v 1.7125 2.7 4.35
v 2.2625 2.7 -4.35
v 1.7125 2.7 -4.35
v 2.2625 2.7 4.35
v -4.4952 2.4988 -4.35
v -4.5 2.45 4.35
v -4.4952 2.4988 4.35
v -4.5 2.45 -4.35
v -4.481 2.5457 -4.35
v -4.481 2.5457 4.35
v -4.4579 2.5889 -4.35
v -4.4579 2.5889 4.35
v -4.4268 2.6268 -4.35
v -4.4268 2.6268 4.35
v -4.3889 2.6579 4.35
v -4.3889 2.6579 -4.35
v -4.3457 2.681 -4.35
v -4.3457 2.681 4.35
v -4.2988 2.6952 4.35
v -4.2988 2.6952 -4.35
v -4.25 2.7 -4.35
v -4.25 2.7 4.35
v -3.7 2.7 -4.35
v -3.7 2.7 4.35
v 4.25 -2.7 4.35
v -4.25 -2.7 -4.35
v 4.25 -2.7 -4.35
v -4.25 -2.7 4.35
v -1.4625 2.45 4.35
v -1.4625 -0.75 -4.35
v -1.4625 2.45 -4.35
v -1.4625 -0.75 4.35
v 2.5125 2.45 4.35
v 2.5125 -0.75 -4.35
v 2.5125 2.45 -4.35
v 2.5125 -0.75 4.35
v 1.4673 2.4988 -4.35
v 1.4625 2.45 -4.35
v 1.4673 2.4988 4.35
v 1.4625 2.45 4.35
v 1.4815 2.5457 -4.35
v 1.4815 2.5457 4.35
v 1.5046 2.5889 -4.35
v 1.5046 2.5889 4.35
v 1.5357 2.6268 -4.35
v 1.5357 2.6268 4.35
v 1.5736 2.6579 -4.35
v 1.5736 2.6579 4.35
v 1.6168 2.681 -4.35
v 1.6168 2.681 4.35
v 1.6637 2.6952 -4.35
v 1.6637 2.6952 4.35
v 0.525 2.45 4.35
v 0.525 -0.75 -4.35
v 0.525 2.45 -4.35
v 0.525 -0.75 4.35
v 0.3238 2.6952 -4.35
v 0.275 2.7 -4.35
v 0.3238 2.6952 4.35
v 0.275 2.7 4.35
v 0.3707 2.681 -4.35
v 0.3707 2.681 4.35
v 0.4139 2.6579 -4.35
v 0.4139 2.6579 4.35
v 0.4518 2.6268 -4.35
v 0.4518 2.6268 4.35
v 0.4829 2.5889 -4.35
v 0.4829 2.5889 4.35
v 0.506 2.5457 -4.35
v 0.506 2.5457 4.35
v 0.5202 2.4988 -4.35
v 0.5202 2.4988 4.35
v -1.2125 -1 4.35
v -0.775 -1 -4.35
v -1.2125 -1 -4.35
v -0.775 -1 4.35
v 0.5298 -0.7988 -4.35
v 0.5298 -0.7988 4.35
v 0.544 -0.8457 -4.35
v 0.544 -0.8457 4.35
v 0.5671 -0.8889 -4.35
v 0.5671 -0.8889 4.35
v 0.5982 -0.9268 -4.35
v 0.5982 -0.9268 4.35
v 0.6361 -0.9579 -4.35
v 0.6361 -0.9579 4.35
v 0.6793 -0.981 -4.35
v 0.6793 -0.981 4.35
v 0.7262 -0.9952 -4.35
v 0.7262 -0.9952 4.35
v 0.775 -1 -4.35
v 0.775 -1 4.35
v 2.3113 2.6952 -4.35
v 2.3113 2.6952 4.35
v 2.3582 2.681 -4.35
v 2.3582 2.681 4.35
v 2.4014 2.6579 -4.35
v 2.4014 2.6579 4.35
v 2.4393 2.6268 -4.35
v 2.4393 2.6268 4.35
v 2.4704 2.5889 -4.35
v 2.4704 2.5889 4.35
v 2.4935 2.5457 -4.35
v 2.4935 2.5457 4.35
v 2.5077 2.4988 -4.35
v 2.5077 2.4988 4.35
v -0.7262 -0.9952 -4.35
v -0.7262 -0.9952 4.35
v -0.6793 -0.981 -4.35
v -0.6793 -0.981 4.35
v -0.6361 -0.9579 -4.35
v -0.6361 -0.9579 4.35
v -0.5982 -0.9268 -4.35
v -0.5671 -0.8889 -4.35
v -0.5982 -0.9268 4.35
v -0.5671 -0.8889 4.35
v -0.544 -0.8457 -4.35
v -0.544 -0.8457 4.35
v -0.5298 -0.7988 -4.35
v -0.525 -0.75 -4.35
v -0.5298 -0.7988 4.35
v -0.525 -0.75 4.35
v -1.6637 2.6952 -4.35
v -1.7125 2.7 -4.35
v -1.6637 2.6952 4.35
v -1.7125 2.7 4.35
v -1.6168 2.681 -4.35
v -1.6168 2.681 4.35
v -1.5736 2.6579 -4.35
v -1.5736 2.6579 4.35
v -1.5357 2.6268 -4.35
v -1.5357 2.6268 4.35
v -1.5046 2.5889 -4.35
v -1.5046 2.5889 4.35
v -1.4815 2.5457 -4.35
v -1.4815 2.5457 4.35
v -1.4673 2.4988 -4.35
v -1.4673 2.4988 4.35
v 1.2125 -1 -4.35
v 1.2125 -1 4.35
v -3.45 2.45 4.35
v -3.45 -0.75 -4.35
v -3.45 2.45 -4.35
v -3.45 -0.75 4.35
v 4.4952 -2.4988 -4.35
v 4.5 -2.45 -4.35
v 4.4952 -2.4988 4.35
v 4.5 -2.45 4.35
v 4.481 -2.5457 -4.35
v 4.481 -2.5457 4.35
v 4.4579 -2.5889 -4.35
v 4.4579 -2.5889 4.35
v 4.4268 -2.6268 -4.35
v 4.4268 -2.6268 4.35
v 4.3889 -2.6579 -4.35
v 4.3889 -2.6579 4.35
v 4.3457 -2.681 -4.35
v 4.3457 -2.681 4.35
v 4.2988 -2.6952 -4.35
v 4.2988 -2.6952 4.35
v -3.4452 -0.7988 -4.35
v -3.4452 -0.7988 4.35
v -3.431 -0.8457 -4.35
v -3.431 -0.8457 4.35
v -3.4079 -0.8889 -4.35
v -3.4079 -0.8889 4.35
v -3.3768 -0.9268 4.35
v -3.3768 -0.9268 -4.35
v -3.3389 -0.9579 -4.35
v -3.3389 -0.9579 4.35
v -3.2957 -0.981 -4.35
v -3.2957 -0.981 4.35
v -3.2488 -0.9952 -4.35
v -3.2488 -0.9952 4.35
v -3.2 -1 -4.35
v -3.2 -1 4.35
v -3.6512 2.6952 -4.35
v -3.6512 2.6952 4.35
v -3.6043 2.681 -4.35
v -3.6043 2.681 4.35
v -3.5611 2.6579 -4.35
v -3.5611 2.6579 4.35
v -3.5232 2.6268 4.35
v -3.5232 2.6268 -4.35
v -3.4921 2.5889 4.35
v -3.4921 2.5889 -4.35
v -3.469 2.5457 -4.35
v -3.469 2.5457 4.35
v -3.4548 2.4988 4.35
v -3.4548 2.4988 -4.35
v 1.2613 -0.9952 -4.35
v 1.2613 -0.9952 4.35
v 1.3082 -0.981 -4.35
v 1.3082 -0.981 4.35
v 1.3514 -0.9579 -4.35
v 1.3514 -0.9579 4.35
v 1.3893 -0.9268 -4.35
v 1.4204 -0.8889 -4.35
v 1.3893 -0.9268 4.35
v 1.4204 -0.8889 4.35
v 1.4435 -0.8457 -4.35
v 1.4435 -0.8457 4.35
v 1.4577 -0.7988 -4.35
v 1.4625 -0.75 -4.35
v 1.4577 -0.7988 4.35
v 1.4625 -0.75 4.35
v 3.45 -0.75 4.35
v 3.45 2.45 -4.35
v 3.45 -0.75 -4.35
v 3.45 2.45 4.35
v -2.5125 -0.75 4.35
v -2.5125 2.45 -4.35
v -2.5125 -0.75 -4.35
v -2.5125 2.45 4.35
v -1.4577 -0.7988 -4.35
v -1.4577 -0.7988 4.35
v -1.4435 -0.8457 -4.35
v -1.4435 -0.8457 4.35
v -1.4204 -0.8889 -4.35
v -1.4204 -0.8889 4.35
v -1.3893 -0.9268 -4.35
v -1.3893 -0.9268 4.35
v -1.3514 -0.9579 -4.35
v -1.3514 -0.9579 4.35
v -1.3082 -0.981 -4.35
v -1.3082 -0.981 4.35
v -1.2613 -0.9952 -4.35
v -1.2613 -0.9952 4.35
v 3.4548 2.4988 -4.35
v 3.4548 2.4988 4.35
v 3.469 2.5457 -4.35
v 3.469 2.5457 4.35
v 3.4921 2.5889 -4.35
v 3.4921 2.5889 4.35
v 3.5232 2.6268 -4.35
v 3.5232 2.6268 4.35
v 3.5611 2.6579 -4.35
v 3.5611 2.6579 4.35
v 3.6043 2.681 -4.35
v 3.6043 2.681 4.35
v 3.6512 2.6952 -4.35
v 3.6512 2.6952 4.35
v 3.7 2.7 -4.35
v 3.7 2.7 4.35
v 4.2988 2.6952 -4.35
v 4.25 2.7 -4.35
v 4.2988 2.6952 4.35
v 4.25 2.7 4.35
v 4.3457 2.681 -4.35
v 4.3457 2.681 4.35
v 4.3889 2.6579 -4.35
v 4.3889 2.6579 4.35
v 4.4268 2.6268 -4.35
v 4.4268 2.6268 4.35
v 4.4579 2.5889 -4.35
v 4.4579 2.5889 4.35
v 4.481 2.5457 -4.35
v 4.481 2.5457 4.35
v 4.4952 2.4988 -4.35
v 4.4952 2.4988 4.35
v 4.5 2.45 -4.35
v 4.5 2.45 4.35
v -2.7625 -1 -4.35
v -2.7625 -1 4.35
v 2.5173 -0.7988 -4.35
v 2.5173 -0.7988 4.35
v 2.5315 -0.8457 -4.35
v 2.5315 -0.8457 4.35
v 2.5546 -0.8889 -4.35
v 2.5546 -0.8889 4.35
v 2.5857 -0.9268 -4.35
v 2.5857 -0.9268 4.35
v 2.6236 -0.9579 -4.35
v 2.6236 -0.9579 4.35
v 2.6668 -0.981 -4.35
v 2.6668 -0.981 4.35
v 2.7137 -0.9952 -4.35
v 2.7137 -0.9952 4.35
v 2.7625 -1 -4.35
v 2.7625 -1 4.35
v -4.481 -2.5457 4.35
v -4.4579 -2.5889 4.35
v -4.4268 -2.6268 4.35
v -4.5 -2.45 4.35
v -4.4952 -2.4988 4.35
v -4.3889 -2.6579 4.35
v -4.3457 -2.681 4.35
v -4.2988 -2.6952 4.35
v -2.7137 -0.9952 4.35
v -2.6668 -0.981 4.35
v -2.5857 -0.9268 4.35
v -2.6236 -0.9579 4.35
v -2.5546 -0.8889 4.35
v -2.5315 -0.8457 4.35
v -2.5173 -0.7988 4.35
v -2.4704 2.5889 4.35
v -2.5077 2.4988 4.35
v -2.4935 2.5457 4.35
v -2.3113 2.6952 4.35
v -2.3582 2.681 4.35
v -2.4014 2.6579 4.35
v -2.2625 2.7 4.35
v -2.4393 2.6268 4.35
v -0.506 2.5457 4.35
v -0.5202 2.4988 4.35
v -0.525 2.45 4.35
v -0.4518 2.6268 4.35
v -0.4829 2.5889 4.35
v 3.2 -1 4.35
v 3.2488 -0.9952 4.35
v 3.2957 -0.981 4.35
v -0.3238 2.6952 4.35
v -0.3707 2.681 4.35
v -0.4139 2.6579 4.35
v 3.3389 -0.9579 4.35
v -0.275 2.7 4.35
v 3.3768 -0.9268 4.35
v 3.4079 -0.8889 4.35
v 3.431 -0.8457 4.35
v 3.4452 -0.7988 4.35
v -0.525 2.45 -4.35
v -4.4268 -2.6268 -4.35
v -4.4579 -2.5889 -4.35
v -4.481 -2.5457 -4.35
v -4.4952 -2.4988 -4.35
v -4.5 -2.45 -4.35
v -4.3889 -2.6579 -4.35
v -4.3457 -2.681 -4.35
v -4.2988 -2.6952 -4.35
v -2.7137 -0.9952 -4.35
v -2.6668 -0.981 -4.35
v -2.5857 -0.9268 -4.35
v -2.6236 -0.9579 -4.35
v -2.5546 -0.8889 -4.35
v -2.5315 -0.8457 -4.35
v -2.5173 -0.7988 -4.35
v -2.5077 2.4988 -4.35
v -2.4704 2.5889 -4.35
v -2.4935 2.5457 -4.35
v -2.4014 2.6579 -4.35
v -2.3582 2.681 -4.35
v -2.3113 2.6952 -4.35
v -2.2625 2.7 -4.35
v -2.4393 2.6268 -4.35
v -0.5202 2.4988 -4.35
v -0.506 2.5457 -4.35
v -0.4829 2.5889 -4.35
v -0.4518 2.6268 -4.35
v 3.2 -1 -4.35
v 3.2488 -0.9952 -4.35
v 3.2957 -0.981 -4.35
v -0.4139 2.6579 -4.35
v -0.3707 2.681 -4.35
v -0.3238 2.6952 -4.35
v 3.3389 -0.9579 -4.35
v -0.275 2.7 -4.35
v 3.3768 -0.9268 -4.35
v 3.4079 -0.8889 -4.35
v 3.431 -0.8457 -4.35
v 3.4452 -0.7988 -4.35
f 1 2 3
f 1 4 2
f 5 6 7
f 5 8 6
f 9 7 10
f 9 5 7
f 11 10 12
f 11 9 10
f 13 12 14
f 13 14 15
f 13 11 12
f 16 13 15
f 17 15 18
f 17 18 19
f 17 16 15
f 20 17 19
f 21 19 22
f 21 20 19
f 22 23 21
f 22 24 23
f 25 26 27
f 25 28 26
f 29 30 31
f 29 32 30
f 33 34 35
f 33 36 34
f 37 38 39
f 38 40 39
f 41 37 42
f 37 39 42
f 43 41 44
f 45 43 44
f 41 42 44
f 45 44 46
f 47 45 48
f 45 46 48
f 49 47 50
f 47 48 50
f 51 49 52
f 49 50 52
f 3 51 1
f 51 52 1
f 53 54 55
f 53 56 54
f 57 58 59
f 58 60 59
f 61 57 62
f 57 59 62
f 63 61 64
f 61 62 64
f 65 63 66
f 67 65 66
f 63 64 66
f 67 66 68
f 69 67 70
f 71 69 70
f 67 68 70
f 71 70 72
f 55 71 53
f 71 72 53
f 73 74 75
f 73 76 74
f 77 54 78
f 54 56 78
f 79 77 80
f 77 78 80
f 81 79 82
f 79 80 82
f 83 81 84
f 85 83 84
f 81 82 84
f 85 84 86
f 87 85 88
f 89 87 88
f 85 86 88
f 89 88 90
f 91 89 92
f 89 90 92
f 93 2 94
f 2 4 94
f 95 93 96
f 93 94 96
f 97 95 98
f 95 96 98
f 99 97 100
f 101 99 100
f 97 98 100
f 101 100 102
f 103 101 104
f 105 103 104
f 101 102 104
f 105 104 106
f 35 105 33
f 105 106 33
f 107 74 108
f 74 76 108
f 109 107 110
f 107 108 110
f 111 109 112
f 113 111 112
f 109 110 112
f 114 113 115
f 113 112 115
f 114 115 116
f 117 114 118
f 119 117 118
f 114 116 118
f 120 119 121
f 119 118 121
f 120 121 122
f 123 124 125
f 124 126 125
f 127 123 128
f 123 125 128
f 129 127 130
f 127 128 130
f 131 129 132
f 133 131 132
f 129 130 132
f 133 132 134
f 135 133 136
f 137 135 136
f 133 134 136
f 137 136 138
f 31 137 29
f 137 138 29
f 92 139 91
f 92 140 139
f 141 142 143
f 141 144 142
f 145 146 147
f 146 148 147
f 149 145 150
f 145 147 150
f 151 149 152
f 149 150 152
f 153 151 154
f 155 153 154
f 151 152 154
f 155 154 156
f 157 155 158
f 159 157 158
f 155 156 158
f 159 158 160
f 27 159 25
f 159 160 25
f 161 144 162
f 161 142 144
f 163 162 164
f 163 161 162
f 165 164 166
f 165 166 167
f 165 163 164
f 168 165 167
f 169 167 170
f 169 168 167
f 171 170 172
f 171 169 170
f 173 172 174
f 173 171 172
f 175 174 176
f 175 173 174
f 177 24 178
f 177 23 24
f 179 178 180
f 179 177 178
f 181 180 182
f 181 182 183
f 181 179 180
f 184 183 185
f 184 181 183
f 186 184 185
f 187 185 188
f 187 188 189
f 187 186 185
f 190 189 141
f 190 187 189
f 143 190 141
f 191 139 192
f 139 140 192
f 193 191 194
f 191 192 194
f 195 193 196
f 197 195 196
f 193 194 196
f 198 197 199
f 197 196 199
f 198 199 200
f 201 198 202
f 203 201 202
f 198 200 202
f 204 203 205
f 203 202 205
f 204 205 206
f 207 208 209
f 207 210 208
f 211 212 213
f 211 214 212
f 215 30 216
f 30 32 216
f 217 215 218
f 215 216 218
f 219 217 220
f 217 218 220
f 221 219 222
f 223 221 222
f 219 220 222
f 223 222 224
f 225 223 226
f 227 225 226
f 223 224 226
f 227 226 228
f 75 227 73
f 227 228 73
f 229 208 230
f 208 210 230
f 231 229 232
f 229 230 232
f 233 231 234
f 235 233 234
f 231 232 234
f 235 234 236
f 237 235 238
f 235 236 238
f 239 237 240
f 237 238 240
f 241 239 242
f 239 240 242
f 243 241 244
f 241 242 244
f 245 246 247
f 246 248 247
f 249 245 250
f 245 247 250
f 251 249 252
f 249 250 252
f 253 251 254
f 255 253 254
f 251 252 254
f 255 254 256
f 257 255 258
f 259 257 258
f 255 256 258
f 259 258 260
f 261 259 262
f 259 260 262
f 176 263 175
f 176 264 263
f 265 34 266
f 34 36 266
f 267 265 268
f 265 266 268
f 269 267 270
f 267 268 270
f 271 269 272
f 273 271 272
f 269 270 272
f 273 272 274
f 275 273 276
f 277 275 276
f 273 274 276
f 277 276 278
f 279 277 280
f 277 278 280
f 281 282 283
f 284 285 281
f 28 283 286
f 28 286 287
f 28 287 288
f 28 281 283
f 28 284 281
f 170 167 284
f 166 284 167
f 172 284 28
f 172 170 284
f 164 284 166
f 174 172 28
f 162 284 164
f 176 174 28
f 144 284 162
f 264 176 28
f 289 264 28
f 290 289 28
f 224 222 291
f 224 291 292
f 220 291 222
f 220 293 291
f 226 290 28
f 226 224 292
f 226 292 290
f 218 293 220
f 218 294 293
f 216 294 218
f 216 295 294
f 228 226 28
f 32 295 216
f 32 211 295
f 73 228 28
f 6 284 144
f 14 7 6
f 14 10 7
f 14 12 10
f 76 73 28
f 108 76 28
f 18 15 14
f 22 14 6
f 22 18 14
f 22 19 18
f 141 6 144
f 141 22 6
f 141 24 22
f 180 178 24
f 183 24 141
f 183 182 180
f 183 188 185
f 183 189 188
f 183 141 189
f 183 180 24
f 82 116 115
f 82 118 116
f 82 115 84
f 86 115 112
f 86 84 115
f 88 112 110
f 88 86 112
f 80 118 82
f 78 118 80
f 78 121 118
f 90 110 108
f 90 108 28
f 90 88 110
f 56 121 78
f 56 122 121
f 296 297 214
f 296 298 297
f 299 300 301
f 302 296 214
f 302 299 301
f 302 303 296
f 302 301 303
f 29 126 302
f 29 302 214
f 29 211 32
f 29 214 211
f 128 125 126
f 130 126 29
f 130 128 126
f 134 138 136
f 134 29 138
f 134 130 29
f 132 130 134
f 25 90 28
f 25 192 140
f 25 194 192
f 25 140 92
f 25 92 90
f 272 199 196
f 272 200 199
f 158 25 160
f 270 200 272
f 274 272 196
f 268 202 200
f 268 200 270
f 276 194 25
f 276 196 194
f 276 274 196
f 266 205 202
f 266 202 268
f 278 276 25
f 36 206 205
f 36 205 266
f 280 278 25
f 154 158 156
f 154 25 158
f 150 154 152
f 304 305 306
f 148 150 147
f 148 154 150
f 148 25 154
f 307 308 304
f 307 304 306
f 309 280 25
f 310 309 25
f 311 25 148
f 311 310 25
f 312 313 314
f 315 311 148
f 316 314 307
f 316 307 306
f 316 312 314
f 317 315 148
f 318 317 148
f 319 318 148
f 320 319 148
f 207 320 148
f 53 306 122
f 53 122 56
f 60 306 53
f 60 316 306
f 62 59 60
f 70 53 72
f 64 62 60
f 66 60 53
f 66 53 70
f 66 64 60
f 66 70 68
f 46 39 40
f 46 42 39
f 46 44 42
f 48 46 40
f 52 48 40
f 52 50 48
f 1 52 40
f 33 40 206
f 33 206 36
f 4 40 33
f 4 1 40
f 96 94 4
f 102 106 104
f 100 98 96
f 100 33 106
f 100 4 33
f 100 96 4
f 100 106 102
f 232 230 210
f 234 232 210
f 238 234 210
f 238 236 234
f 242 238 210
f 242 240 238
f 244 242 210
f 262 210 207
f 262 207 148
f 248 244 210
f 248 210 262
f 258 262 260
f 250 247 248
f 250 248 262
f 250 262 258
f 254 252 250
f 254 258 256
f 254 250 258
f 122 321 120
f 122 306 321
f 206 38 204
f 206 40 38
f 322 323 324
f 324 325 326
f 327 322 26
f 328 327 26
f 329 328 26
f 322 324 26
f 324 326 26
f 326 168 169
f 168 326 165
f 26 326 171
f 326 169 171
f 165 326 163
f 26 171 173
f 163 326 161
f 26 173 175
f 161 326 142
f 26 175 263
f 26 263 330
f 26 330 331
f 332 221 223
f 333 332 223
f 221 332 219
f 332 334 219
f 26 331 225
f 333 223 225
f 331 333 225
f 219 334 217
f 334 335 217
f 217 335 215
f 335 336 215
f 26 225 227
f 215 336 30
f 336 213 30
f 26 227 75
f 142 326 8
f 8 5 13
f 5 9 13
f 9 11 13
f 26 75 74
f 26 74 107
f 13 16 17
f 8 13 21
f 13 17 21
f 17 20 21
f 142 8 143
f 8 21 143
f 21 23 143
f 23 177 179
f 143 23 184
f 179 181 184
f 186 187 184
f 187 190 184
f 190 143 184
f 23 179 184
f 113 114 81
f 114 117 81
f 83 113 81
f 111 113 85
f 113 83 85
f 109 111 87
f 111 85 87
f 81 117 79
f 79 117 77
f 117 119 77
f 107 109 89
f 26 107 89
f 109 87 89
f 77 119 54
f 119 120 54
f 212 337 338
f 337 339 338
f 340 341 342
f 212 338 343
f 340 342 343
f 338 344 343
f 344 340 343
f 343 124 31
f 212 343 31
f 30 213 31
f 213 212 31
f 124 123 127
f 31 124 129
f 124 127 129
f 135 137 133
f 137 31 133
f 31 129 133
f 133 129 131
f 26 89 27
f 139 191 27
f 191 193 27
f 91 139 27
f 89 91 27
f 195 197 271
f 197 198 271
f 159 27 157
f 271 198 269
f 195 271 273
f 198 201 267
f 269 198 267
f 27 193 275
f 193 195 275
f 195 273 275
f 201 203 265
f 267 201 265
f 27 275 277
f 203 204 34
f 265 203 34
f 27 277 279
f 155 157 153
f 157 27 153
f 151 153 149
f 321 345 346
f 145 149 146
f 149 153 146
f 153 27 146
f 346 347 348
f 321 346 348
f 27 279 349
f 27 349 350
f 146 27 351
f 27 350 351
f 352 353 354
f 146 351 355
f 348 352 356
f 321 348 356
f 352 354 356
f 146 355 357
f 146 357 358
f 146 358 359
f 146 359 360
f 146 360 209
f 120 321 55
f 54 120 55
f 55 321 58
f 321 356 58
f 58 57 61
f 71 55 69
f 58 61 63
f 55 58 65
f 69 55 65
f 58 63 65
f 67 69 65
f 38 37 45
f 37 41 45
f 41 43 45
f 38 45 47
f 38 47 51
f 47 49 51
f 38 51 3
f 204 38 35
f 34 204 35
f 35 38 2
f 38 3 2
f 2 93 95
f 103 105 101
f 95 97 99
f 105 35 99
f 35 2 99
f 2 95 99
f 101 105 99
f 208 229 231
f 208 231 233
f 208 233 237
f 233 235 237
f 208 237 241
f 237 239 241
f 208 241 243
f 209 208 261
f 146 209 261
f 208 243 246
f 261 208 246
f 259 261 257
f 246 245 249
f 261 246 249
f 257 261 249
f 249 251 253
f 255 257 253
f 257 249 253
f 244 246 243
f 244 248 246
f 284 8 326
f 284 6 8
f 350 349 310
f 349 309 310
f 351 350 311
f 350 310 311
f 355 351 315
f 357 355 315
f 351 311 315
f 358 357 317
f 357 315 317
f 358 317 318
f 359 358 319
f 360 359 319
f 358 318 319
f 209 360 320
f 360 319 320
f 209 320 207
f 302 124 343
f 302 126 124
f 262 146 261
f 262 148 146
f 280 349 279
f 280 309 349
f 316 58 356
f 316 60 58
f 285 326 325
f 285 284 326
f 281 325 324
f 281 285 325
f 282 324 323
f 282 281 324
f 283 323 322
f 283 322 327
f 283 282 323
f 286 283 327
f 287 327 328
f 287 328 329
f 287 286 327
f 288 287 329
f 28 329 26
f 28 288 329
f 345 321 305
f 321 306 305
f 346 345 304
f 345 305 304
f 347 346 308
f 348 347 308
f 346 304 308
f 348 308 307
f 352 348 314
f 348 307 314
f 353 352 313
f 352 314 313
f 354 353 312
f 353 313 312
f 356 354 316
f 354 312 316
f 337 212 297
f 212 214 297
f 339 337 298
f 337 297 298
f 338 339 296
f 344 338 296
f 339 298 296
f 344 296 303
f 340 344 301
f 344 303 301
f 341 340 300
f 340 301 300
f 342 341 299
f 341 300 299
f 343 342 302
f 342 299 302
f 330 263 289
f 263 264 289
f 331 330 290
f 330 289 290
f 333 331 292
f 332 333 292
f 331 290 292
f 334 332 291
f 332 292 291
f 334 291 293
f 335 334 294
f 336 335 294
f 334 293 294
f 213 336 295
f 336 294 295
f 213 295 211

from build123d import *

# Parameters (mm, degrees)
BOSS_EXTRUDE1_DEPTH = 4.35
FILLET1_R           = 0.25


with BuildPart() as part:
    # Sketch1 → Boss-Extrude1 (new body, symmetric)
    with BuildSketch(Plane.XY):
        Polygon((-4.5, 2.7), (-4.5, -2.7), (4.5, -2.7), (4.5, 2.7), (3.45, 2.7), (3.45, -1), (2.5125, -1), (2.5125, 2.7), (1.4625, 2.7), (1.4625, -1), (0.525, -1), (0.525, 2.7), (-0.525, 2.7), (-0.525, -1), (-1.4625, -1), (-1.4625, 2.7), (-2.5125, 2.7), (-2.5125, -1), (-3.45, -1), (-3.45, 2.7), align=None)
    extrude(amount=BOSS_EXTRUDE1_DEPTH, both=True)

    # Fillet1
    fillet1_edges = [part.edges().sort_by_distance(p)[0] for p in [
        (-3.45, 2.7, 0),
        (-3.45, -1, 0),
        (-2.5125, -1, 0),
        (-2.5125, 2.7, 0),
        (-1.4625, 2.7, 0),
        (-1.4625, -1, 0),
        (-0.525, -1, 0),
        (-0.525, 2.7, 0),
        (0.525, 2.7, 0),
        (0.525, -1, 0),
        (1.4625, -1, 0),
        (1.4625, 2.7, 0),
        (2.5125, 2.7, 0),
        (2.5125, -1, 0),
        (3.45, -1, 0),
        (3.45, 2.7, 0),
        (4.5, 2.7, 0),
        (4.5, -2.7, 0),
        (-4.5, -2.7, 0),
        (-4.5, 2.7, 0),
    ]]
    fillet(fillet1_edges, radius=FILLET1_R)


solid = part.part
